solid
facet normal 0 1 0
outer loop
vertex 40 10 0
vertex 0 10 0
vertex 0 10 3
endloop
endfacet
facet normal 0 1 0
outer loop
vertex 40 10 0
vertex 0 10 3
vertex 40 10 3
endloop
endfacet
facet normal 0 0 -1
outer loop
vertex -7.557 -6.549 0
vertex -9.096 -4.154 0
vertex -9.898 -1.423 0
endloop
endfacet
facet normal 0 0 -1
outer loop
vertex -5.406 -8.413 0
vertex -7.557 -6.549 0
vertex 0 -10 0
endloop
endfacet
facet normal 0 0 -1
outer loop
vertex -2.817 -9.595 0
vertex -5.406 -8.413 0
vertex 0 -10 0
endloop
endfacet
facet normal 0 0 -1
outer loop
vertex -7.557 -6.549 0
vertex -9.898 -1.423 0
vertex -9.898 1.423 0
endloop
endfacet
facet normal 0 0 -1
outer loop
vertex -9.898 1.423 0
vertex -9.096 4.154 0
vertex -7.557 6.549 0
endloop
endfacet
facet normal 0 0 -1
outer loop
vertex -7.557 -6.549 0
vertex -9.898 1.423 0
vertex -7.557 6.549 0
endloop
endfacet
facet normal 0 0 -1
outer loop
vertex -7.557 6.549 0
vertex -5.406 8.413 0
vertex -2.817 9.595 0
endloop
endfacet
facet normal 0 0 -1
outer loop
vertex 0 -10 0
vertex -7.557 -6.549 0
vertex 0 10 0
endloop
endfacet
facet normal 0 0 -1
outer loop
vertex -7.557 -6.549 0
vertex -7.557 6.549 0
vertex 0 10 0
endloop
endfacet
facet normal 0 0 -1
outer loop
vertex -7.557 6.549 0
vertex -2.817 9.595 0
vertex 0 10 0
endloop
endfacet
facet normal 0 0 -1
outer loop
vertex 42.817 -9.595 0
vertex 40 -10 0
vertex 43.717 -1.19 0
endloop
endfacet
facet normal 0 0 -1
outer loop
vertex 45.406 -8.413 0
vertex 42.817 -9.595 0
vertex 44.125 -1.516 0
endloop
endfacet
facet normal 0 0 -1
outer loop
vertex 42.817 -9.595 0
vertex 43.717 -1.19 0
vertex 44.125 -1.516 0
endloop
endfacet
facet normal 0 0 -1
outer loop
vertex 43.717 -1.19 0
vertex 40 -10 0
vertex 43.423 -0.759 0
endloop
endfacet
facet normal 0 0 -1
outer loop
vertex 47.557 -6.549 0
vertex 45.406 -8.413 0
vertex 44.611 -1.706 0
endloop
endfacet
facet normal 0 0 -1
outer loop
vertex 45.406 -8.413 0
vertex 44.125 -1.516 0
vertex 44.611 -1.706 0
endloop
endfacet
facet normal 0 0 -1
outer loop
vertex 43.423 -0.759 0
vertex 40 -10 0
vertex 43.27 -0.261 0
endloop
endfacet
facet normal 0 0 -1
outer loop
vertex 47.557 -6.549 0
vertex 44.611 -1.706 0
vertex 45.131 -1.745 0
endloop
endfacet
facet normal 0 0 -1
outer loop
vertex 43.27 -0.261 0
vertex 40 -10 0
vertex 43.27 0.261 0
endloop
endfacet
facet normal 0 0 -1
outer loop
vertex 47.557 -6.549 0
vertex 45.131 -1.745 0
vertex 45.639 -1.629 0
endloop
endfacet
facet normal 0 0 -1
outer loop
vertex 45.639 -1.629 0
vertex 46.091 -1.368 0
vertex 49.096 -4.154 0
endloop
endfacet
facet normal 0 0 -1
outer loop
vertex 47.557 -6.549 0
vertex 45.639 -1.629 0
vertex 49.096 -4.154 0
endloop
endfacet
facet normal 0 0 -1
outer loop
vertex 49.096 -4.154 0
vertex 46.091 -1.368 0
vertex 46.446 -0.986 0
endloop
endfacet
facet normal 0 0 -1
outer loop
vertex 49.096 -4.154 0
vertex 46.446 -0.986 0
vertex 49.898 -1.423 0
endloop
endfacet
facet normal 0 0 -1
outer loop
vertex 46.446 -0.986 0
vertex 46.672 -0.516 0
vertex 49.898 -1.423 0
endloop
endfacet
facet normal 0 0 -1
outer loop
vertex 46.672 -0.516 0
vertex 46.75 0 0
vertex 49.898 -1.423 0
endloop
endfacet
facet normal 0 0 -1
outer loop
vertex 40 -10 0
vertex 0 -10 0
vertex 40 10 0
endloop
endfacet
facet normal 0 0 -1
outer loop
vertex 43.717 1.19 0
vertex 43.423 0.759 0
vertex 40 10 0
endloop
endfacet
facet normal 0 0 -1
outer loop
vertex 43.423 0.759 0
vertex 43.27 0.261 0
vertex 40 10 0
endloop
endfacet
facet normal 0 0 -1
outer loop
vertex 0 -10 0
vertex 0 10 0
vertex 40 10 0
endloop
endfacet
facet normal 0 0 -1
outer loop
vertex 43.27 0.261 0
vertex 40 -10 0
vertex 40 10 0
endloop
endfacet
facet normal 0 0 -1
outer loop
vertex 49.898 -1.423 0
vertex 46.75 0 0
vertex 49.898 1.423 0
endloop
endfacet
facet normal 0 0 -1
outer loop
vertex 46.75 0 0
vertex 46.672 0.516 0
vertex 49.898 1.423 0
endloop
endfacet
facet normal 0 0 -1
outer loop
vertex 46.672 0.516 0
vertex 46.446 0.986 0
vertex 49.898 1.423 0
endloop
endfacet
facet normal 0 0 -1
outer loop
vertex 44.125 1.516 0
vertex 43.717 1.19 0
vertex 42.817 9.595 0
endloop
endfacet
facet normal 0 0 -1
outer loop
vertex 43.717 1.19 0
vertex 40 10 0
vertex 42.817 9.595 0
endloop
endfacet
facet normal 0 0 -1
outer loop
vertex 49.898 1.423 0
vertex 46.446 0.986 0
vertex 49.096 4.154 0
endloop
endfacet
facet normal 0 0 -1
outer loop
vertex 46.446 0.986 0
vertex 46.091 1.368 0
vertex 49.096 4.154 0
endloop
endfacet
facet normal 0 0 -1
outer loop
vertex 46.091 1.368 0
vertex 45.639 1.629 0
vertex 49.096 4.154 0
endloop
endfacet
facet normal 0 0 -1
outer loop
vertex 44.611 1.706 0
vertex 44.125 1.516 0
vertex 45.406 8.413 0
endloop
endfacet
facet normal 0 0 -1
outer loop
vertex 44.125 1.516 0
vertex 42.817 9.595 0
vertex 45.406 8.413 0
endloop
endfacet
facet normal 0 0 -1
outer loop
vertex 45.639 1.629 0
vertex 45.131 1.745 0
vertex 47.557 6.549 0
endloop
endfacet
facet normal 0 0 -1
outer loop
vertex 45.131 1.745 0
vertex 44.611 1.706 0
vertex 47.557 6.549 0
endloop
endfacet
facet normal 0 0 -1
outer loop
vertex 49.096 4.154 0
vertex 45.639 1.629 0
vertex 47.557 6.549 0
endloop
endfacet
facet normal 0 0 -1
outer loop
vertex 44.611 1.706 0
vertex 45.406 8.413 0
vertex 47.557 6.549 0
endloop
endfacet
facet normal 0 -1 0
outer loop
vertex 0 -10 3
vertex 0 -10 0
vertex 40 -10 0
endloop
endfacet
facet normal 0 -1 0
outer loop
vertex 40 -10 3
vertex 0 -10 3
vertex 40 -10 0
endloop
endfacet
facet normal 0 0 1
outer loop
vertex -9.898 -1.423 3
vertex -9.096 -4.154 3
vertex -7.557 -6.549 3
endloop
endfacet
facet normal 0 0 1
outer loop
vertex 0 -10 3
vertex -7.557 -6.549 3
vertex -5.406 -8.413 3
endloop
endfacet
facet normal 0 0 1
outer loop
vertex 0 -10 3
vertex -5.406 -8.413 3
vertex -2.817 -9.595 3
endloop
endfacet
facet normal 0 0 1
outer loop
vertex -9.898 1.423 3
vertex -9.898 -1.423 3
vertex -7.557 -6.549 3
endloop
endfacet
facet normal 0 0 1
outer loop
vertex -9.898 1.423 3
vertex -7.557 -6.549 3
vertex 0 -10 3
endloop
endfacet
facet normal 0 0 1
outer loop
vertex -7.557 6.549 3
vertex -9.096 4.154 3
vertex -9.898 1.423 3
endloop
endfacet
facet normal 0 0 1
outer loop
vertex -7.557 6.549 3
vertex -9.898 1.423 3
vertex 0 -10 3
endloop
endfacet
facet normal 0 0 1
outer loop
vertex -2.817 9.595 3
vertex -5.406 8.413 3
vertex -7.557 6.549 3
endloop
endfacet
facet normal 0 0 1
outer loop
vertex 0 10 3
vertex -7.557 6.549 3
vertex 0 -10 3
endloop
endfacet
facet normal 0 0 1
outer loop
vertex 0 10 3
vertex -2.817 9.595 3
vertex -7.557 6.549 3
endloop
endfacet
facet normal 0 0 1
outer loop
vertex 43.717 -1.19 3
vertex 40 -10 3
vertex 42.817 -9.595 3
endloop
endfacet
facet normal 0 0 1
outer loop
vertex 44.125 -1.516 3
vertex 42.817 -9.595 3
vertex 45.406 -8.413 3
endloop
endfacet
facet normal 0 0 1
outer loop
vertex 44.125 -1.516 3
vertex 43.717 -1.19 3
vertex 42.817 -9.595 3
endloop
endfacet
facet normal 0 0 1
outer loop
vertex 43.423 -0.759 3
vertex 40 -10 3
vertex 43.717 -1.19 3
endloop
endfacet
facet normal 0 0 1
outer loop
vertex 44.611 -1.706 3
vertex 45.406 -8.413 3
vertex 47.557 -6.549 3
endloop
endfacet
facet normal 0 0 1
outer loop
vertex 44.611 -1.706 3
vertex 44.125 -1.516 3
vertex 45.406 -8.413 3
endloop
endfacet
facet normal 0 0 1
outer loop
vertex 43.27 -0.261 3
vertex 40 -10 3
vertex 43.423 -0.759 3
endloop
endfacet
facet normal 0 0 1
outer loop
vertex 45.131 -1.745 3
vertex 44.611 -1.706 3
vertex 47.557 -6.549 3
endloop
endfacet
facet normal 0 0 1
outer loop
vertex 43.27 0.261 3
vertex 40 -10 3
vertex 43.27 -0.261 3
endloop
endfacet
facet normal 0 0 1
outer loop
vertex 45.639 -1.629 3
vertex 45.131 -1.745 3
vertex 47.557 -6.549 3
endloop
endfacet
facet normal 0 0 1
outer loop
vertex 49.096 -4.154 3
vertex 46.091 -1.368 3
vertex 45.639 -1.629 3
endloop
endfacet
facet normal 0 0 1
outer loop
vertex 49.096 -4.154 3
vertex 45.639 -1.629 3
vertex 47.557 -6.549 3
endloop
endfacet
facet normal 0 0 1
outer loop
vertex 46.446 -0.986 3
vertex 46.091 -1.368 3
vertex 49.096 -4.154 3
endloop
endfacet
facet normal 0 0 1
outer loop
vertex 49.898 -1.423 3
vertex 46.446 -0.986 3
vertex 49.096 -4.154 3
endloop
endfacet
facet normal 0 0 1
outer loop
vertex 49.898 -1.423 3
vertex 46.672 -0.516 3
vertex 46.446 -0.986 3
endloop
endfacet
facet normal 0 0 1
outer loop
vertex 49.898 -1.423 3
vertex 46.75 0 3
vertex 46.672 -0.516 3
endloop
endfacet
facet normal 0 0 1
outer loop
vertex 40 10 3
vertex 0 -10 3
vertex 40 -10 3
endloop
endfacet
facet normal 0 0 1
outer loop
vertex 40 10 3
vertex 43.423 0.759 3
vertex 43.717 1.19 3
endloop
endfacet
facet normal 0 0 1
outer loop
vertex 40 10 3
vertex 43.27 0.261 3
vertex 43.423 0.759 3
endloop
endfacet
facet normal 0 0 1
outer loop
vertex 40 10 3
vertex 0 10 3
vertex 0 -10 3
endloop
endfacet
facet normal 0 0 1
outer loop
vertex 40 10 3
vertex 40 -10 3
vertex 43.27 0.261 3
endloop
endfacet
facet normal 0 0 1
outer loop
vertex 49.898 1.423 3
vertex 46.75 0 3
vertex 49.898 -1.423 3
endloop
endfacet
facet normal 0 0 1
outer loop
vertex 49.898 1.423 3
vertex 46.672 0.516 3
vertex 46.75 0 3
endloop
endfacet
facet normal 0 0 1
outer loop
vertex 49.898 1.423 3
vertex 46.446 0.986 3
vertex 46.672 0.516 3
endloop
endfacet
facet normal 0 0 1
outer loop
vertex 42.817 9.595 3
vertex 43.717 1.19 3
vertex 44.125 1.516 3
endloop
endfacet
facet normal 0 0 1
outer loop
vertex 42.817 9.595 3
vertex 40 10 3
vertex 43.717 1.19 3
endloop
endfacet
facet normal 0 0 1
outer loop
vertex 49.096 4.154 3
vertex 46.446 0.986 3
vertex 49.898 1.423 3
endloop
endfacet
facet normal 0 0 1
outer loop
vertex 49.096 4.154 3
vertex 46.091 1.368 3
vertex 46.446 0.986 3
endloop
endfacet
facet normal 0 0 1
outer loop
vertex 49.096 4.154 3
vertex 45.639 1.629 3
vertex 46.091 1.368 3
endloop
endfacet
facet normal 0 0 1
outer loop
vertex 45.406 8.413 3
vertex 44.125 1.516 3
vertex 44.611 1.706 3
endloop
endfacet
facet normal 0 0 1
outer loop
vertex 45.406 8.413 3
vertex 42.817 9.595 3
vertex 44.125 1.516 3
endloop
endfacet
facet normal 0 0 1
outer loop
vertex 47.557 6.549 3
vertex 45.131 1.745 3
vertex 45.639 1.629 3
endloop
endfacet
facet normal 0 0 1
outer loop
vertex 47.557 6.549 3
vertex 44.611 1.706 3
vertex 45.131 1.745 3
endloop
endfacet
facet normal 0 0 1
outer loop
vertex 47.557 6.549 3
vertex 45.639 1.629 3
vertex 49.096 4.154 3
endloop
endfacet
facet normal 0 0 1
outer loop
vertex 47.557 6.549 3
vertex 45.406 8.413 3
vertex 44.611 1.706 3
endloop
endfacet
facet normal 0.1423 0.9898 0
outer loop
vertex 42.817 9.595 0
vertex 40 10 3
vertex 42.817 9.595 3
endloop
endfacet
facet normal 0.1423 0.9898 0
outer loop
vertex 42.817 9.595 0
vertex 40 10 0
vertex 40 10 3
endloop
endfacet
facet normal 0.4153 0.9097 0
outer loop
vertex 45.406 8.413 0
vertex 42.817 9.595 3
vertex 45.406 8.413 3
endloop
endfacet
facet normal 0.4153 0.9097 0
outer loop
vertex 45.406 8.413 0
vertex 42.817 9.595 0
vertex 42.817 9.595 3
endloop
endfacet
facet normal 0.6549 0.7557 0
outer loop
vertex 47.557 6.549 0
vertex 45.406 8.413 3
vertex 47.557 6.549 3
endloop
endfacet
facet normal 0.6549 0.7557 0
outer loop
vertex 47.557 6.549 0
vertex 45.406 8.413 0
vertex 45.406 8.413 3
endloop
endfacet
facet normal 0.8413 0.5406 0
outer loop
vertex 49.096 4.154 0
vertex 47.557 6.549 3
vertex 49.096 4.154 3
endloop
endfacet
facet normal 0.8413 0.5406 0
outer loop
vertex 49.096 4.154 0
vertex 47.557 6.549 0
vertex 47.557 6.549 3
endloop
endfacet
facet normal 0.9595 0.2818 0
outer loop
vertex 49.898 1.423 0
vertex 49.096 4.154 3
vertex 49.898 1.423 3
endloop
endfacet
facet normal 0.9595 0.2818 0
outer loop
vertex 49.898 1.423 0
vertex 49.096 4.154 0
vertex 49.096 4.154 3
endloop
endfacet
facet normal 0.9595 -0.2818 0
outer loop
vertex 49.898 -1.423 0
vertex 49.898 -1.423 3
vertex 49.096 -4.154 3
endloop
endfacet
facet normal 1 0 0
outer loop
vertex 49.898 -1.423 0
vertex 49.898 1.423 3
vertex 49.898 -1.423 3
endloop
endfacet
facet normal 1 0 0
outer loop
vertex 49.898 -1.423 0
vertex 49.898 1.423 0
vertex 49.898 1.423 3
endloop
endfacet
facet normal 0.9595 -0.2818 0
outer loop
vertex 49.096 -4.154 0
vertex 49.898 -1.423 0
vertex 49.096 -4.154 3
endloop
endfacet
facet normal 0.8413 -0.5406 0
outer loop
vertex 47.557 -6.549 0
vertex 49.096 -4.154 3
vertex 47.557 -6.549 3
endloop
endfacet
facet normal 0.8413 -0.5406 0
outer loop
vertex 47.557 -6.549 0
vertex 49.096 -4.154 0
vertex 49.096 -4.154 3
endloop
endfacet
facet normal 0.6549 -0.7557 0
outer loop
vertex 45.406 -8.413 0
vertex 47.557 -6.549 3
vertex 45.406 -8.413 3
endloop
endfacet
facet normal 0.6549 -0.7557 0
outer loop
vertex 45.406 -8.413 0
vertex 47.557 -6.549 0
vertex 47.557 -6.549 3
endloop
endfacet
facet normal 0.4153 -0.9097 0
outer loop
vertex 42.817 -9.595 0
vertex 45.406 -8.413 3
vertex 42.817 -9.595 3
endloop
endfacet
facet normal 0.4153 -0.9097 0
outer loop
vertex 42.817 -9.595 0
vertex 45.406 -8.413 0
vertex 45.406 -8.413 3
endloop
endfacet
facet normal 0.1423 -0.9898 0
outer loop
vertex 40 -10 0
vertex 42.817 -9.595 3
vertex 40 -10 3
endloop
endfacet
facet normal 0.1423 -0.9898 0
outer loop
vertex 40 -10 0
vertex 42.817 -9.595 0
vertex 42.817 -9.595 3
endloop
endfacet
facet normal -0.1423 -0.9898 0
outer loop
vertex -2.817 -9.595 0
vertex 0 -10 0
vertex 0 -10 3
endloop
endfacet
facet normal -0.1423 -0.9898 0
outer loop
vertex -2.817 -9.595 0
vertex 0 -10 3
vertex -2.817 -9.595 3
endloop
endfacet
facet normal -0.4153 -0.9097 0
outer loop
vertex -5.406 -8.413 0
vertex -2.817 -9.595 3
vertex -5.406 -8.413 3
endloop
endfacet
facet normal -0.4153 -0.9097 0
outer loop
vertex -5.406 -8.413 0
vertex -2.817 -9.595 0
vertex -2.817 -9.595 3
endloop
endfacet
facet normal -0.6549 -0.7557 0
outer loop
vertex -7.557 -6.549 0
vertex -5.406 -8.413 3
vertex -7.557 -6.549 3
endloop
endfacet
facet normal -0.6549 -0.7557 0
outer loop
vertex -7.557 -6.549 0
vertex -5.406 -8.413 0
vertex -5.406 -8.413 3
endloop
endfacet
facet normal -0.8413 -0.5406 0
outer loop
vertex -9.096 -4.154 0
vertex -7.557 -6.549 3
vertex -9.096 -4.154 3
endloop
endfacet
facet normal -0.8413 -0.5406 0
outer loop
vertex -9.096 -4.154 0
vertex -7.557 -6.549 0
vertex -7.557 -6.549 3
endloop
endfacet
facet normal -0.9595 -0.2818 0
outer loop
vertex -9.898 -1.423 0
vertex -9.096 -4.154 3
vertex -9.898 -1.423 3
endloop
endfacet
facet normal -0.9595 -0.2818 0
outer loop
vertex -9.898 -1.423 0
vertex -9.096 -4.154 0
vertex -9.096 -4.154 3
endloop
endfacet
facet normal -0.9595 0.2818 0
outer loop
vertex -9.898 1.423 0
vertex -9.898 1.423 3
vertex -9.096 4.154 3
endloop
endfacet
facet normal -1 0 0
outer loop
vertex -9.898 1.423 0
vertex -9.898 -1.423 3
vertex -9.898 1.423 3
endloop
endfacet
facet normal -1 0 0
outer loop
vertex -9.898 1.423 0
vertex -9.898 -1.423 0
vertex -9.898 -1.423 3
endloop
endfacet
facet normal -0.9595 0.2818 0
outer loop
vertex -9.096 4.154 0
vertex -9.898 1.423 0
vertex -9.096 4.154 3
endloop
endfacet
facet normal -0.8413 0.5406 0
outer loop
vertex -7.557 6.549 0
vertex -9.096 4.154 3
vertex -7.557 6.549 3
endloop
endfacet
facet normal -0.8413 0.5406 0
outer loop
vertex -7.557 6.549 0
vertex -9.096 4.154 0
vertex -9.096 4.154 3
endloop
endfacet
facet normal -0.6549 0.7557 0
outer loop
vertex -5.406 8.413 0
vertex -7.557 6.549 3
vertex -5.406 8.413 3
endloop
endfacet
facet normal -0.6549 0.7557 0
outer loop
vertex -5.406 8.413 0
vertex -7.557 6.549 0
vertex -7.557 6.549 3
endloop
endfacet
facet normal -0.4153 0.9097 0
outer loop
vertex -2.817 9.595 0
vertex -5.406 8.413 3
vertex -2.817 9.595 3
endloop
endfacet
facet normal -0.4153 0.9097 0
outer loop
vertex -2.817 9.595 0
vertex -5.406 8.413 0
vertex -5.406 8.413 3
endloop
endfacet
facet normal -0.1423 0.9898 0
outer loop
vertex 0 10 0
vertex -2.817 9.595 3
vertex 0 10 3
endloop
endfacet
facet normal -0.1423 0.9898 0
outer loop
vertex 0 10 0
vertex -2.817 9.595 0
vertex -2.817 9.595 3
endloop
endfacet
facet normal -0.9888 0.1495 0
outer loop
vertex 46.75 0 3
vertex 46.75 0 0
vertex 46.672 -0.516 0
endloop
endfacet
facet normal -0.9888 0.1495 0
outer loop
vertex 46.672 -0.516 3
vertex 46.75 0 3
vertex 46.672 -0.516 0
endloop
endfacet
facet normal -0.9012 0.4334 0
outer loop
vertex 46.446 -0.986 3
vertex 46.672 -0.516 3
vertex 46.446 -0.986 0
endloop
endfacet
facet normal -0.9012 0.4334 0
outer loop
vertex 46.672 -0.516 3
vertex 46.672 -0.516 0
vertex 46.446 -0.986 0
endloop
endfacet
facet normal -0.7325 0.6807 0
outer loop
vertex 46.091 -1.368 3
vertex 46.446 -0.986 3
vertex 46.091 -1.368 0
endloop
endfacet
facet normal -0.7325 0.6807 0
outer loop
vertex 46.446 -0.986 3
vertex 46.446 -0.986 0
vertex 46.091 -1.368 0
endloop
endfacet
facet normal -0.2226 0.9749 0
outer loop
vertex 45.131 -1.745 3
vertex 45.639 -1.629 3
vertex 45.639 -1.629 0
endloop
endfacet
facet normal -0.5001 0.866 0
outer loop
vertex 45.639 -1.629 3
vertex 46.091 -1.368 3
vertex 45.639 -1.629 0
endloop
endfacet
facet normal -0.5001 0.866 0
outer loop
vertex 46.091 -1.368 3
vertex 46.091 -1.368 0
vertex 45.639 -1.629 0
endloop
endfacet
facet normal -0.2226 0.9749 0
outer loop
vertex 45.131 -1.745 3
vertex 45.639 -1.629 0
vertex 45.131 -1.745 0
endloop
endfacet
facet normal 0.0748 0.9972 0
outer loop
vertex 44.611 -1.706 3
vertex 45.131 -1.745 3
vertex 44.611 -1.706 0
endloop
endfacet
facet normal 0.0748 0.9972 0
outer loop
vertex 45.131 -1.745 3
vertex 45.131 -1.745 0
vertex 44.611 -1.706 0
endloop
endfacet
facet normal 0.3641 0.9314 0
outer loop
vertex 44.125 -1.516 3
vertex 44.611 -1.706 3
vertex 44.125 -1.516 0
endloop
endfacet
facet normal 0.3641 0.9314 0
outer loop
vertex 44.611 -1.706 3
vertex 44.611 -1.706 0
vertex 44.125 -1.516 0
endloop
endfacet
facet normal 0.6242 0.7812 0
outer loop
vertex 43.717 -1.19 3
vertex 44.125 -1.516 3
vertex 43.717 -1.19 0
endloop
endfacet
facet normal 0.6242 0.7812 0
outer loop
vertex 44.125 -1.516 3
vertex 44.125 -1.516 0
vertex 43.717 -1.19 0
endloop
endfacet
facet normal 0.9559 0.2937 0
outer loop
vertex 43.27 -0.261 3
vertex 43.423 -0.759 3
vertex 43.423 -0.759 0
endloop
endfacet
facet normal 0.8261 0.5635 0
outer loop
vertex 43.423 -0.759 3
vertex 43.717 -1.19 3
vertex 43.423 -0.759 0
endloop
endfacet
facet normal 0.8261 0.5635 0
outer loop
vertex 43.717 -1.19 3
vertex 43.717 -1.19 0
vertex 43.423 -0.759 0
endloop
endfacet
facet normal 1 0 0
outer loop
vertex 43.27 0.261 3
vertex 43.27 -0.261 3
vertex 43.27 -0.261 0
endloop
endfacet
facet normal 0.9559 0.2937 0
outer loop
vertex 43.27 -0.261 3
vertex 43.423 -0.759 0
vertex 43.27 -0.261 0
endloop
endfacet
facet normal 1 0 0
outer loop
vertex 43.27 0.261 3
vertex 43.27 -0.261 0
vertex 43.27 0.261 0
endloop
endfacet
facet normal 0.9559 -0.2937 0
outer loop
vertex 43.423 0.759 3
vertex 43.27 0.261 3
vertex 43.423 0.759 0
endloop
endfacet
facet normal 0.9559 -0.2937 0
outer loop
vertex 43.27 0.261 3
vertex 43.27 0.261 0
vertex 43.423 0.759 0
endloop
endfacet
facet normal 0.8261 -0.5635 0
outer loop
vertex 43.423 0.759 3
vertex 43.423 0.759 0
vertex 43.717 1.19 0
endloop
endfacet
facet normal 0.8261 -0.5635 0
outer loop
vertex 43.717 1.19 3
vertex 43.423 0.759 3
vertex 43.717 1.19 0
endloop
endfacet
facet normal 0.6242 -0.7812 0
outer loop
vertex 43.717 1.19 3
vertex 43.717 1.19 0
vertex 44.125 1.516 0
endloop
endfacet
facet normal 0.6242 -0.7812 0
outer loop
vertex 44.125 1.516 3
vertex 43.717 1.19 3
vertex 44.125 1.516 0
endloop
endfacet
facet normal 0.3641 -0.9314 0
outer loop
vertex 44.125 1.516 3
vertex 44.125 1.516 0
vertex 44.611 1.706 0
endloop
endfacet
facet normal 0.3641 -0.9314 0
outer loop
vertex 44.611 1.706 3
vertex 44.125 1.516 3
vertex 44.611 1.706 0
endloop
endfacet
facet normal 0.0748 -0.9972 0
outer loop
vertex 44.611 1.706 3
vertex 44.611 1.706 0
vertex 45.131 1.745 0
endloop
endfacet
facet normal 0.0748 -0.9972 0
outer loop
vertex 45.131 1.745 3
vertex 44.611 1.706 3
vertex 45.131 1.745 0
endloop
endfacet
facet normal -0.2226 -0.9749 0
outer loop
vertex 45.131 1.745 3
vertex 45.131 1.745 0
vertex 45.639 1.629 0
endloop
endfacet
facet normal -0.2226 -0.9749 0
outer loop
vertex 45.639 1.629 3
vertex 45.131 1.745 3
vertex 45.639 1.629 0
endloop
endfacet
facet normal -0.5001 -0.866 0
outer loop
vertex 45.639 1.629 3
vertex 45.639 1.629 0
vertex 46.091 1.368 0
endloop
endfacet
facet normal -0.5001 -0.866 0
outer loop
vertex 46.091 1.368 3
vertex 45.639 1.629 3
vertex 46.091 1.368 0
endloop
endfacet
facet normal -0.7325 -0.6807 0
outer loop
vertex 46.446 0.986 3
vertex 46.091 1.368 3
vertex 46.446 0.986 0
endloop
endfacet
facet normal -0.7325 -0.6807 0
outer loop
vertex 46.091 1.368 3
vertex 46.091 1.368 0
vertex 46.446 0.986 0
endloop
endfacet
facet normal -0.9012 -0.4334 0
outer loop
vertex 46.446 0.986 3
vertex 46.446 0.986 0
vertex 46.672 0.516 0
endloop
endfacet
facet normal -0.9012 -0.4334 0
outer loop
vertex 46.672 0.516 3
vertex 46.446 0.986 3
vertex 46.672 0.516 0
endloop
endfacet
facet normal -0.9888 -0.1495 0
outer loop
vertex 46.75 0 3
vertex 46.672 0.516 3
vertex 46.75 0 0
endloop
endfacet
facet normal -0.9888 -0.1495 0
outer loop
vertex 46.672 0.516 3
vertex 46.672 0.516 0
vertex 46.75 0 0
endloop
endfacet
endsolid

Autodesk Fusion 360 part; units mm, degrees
sketch "Sketch1" plane through (0, 0, 0) normal (0, 0, 1) x (1, 0, 0)
  line L0 (0, 0) -> (40, 0) construction
  line L1 (0, 10) -> (40, 10)
  line L2 (0, -10) -> (40, -10)
  arc A0 (0, 10) -> (0, -10) centre (0, 0) ccw
  arc A1 (40, -10) -> (40, 10) centre (40, 0) ccw
  circle A2 centre (45, 0) radius 1.75
  line L3 (50, 9.724) -> (50, -11.0876) construction
  dimension "d1" = 20
  dimension "d2" = 20
  dimension "d3" = 40
  dimension "d4" = 3.5
  dimension "d5" = 5
extrude "Extrude1" add sketch "Sketch1" along normal blind 3
sketch "DXF_outline" plane through (0, 0, 3) normal (0, 0, 1) x (-1, 0, 0)
  circle A0 centre (-45, 0) radius 1.75
  arc A1 (0, -10) -> (0, 10) centre (0, 0) ccw
  line L0 (0, 10) -> (-40, 10)
  arc A2 (-40, 10) -> (-40, -10) centre (-40, 0) ccw
  line L1 (-40, -10) -> (0, -10)
equation "d1 = width"
equation "d2 = d1"
equation "d3 = length"
equation "d4 = keyhole"
equation "d5 = d4 + 1.5 mm"
equation "width = 20 mm" comment "Width"
equation "length = 40 mm" comment "Overall length"
equation "keyhole = 3.5 mm" comment "Key hole diameter"
